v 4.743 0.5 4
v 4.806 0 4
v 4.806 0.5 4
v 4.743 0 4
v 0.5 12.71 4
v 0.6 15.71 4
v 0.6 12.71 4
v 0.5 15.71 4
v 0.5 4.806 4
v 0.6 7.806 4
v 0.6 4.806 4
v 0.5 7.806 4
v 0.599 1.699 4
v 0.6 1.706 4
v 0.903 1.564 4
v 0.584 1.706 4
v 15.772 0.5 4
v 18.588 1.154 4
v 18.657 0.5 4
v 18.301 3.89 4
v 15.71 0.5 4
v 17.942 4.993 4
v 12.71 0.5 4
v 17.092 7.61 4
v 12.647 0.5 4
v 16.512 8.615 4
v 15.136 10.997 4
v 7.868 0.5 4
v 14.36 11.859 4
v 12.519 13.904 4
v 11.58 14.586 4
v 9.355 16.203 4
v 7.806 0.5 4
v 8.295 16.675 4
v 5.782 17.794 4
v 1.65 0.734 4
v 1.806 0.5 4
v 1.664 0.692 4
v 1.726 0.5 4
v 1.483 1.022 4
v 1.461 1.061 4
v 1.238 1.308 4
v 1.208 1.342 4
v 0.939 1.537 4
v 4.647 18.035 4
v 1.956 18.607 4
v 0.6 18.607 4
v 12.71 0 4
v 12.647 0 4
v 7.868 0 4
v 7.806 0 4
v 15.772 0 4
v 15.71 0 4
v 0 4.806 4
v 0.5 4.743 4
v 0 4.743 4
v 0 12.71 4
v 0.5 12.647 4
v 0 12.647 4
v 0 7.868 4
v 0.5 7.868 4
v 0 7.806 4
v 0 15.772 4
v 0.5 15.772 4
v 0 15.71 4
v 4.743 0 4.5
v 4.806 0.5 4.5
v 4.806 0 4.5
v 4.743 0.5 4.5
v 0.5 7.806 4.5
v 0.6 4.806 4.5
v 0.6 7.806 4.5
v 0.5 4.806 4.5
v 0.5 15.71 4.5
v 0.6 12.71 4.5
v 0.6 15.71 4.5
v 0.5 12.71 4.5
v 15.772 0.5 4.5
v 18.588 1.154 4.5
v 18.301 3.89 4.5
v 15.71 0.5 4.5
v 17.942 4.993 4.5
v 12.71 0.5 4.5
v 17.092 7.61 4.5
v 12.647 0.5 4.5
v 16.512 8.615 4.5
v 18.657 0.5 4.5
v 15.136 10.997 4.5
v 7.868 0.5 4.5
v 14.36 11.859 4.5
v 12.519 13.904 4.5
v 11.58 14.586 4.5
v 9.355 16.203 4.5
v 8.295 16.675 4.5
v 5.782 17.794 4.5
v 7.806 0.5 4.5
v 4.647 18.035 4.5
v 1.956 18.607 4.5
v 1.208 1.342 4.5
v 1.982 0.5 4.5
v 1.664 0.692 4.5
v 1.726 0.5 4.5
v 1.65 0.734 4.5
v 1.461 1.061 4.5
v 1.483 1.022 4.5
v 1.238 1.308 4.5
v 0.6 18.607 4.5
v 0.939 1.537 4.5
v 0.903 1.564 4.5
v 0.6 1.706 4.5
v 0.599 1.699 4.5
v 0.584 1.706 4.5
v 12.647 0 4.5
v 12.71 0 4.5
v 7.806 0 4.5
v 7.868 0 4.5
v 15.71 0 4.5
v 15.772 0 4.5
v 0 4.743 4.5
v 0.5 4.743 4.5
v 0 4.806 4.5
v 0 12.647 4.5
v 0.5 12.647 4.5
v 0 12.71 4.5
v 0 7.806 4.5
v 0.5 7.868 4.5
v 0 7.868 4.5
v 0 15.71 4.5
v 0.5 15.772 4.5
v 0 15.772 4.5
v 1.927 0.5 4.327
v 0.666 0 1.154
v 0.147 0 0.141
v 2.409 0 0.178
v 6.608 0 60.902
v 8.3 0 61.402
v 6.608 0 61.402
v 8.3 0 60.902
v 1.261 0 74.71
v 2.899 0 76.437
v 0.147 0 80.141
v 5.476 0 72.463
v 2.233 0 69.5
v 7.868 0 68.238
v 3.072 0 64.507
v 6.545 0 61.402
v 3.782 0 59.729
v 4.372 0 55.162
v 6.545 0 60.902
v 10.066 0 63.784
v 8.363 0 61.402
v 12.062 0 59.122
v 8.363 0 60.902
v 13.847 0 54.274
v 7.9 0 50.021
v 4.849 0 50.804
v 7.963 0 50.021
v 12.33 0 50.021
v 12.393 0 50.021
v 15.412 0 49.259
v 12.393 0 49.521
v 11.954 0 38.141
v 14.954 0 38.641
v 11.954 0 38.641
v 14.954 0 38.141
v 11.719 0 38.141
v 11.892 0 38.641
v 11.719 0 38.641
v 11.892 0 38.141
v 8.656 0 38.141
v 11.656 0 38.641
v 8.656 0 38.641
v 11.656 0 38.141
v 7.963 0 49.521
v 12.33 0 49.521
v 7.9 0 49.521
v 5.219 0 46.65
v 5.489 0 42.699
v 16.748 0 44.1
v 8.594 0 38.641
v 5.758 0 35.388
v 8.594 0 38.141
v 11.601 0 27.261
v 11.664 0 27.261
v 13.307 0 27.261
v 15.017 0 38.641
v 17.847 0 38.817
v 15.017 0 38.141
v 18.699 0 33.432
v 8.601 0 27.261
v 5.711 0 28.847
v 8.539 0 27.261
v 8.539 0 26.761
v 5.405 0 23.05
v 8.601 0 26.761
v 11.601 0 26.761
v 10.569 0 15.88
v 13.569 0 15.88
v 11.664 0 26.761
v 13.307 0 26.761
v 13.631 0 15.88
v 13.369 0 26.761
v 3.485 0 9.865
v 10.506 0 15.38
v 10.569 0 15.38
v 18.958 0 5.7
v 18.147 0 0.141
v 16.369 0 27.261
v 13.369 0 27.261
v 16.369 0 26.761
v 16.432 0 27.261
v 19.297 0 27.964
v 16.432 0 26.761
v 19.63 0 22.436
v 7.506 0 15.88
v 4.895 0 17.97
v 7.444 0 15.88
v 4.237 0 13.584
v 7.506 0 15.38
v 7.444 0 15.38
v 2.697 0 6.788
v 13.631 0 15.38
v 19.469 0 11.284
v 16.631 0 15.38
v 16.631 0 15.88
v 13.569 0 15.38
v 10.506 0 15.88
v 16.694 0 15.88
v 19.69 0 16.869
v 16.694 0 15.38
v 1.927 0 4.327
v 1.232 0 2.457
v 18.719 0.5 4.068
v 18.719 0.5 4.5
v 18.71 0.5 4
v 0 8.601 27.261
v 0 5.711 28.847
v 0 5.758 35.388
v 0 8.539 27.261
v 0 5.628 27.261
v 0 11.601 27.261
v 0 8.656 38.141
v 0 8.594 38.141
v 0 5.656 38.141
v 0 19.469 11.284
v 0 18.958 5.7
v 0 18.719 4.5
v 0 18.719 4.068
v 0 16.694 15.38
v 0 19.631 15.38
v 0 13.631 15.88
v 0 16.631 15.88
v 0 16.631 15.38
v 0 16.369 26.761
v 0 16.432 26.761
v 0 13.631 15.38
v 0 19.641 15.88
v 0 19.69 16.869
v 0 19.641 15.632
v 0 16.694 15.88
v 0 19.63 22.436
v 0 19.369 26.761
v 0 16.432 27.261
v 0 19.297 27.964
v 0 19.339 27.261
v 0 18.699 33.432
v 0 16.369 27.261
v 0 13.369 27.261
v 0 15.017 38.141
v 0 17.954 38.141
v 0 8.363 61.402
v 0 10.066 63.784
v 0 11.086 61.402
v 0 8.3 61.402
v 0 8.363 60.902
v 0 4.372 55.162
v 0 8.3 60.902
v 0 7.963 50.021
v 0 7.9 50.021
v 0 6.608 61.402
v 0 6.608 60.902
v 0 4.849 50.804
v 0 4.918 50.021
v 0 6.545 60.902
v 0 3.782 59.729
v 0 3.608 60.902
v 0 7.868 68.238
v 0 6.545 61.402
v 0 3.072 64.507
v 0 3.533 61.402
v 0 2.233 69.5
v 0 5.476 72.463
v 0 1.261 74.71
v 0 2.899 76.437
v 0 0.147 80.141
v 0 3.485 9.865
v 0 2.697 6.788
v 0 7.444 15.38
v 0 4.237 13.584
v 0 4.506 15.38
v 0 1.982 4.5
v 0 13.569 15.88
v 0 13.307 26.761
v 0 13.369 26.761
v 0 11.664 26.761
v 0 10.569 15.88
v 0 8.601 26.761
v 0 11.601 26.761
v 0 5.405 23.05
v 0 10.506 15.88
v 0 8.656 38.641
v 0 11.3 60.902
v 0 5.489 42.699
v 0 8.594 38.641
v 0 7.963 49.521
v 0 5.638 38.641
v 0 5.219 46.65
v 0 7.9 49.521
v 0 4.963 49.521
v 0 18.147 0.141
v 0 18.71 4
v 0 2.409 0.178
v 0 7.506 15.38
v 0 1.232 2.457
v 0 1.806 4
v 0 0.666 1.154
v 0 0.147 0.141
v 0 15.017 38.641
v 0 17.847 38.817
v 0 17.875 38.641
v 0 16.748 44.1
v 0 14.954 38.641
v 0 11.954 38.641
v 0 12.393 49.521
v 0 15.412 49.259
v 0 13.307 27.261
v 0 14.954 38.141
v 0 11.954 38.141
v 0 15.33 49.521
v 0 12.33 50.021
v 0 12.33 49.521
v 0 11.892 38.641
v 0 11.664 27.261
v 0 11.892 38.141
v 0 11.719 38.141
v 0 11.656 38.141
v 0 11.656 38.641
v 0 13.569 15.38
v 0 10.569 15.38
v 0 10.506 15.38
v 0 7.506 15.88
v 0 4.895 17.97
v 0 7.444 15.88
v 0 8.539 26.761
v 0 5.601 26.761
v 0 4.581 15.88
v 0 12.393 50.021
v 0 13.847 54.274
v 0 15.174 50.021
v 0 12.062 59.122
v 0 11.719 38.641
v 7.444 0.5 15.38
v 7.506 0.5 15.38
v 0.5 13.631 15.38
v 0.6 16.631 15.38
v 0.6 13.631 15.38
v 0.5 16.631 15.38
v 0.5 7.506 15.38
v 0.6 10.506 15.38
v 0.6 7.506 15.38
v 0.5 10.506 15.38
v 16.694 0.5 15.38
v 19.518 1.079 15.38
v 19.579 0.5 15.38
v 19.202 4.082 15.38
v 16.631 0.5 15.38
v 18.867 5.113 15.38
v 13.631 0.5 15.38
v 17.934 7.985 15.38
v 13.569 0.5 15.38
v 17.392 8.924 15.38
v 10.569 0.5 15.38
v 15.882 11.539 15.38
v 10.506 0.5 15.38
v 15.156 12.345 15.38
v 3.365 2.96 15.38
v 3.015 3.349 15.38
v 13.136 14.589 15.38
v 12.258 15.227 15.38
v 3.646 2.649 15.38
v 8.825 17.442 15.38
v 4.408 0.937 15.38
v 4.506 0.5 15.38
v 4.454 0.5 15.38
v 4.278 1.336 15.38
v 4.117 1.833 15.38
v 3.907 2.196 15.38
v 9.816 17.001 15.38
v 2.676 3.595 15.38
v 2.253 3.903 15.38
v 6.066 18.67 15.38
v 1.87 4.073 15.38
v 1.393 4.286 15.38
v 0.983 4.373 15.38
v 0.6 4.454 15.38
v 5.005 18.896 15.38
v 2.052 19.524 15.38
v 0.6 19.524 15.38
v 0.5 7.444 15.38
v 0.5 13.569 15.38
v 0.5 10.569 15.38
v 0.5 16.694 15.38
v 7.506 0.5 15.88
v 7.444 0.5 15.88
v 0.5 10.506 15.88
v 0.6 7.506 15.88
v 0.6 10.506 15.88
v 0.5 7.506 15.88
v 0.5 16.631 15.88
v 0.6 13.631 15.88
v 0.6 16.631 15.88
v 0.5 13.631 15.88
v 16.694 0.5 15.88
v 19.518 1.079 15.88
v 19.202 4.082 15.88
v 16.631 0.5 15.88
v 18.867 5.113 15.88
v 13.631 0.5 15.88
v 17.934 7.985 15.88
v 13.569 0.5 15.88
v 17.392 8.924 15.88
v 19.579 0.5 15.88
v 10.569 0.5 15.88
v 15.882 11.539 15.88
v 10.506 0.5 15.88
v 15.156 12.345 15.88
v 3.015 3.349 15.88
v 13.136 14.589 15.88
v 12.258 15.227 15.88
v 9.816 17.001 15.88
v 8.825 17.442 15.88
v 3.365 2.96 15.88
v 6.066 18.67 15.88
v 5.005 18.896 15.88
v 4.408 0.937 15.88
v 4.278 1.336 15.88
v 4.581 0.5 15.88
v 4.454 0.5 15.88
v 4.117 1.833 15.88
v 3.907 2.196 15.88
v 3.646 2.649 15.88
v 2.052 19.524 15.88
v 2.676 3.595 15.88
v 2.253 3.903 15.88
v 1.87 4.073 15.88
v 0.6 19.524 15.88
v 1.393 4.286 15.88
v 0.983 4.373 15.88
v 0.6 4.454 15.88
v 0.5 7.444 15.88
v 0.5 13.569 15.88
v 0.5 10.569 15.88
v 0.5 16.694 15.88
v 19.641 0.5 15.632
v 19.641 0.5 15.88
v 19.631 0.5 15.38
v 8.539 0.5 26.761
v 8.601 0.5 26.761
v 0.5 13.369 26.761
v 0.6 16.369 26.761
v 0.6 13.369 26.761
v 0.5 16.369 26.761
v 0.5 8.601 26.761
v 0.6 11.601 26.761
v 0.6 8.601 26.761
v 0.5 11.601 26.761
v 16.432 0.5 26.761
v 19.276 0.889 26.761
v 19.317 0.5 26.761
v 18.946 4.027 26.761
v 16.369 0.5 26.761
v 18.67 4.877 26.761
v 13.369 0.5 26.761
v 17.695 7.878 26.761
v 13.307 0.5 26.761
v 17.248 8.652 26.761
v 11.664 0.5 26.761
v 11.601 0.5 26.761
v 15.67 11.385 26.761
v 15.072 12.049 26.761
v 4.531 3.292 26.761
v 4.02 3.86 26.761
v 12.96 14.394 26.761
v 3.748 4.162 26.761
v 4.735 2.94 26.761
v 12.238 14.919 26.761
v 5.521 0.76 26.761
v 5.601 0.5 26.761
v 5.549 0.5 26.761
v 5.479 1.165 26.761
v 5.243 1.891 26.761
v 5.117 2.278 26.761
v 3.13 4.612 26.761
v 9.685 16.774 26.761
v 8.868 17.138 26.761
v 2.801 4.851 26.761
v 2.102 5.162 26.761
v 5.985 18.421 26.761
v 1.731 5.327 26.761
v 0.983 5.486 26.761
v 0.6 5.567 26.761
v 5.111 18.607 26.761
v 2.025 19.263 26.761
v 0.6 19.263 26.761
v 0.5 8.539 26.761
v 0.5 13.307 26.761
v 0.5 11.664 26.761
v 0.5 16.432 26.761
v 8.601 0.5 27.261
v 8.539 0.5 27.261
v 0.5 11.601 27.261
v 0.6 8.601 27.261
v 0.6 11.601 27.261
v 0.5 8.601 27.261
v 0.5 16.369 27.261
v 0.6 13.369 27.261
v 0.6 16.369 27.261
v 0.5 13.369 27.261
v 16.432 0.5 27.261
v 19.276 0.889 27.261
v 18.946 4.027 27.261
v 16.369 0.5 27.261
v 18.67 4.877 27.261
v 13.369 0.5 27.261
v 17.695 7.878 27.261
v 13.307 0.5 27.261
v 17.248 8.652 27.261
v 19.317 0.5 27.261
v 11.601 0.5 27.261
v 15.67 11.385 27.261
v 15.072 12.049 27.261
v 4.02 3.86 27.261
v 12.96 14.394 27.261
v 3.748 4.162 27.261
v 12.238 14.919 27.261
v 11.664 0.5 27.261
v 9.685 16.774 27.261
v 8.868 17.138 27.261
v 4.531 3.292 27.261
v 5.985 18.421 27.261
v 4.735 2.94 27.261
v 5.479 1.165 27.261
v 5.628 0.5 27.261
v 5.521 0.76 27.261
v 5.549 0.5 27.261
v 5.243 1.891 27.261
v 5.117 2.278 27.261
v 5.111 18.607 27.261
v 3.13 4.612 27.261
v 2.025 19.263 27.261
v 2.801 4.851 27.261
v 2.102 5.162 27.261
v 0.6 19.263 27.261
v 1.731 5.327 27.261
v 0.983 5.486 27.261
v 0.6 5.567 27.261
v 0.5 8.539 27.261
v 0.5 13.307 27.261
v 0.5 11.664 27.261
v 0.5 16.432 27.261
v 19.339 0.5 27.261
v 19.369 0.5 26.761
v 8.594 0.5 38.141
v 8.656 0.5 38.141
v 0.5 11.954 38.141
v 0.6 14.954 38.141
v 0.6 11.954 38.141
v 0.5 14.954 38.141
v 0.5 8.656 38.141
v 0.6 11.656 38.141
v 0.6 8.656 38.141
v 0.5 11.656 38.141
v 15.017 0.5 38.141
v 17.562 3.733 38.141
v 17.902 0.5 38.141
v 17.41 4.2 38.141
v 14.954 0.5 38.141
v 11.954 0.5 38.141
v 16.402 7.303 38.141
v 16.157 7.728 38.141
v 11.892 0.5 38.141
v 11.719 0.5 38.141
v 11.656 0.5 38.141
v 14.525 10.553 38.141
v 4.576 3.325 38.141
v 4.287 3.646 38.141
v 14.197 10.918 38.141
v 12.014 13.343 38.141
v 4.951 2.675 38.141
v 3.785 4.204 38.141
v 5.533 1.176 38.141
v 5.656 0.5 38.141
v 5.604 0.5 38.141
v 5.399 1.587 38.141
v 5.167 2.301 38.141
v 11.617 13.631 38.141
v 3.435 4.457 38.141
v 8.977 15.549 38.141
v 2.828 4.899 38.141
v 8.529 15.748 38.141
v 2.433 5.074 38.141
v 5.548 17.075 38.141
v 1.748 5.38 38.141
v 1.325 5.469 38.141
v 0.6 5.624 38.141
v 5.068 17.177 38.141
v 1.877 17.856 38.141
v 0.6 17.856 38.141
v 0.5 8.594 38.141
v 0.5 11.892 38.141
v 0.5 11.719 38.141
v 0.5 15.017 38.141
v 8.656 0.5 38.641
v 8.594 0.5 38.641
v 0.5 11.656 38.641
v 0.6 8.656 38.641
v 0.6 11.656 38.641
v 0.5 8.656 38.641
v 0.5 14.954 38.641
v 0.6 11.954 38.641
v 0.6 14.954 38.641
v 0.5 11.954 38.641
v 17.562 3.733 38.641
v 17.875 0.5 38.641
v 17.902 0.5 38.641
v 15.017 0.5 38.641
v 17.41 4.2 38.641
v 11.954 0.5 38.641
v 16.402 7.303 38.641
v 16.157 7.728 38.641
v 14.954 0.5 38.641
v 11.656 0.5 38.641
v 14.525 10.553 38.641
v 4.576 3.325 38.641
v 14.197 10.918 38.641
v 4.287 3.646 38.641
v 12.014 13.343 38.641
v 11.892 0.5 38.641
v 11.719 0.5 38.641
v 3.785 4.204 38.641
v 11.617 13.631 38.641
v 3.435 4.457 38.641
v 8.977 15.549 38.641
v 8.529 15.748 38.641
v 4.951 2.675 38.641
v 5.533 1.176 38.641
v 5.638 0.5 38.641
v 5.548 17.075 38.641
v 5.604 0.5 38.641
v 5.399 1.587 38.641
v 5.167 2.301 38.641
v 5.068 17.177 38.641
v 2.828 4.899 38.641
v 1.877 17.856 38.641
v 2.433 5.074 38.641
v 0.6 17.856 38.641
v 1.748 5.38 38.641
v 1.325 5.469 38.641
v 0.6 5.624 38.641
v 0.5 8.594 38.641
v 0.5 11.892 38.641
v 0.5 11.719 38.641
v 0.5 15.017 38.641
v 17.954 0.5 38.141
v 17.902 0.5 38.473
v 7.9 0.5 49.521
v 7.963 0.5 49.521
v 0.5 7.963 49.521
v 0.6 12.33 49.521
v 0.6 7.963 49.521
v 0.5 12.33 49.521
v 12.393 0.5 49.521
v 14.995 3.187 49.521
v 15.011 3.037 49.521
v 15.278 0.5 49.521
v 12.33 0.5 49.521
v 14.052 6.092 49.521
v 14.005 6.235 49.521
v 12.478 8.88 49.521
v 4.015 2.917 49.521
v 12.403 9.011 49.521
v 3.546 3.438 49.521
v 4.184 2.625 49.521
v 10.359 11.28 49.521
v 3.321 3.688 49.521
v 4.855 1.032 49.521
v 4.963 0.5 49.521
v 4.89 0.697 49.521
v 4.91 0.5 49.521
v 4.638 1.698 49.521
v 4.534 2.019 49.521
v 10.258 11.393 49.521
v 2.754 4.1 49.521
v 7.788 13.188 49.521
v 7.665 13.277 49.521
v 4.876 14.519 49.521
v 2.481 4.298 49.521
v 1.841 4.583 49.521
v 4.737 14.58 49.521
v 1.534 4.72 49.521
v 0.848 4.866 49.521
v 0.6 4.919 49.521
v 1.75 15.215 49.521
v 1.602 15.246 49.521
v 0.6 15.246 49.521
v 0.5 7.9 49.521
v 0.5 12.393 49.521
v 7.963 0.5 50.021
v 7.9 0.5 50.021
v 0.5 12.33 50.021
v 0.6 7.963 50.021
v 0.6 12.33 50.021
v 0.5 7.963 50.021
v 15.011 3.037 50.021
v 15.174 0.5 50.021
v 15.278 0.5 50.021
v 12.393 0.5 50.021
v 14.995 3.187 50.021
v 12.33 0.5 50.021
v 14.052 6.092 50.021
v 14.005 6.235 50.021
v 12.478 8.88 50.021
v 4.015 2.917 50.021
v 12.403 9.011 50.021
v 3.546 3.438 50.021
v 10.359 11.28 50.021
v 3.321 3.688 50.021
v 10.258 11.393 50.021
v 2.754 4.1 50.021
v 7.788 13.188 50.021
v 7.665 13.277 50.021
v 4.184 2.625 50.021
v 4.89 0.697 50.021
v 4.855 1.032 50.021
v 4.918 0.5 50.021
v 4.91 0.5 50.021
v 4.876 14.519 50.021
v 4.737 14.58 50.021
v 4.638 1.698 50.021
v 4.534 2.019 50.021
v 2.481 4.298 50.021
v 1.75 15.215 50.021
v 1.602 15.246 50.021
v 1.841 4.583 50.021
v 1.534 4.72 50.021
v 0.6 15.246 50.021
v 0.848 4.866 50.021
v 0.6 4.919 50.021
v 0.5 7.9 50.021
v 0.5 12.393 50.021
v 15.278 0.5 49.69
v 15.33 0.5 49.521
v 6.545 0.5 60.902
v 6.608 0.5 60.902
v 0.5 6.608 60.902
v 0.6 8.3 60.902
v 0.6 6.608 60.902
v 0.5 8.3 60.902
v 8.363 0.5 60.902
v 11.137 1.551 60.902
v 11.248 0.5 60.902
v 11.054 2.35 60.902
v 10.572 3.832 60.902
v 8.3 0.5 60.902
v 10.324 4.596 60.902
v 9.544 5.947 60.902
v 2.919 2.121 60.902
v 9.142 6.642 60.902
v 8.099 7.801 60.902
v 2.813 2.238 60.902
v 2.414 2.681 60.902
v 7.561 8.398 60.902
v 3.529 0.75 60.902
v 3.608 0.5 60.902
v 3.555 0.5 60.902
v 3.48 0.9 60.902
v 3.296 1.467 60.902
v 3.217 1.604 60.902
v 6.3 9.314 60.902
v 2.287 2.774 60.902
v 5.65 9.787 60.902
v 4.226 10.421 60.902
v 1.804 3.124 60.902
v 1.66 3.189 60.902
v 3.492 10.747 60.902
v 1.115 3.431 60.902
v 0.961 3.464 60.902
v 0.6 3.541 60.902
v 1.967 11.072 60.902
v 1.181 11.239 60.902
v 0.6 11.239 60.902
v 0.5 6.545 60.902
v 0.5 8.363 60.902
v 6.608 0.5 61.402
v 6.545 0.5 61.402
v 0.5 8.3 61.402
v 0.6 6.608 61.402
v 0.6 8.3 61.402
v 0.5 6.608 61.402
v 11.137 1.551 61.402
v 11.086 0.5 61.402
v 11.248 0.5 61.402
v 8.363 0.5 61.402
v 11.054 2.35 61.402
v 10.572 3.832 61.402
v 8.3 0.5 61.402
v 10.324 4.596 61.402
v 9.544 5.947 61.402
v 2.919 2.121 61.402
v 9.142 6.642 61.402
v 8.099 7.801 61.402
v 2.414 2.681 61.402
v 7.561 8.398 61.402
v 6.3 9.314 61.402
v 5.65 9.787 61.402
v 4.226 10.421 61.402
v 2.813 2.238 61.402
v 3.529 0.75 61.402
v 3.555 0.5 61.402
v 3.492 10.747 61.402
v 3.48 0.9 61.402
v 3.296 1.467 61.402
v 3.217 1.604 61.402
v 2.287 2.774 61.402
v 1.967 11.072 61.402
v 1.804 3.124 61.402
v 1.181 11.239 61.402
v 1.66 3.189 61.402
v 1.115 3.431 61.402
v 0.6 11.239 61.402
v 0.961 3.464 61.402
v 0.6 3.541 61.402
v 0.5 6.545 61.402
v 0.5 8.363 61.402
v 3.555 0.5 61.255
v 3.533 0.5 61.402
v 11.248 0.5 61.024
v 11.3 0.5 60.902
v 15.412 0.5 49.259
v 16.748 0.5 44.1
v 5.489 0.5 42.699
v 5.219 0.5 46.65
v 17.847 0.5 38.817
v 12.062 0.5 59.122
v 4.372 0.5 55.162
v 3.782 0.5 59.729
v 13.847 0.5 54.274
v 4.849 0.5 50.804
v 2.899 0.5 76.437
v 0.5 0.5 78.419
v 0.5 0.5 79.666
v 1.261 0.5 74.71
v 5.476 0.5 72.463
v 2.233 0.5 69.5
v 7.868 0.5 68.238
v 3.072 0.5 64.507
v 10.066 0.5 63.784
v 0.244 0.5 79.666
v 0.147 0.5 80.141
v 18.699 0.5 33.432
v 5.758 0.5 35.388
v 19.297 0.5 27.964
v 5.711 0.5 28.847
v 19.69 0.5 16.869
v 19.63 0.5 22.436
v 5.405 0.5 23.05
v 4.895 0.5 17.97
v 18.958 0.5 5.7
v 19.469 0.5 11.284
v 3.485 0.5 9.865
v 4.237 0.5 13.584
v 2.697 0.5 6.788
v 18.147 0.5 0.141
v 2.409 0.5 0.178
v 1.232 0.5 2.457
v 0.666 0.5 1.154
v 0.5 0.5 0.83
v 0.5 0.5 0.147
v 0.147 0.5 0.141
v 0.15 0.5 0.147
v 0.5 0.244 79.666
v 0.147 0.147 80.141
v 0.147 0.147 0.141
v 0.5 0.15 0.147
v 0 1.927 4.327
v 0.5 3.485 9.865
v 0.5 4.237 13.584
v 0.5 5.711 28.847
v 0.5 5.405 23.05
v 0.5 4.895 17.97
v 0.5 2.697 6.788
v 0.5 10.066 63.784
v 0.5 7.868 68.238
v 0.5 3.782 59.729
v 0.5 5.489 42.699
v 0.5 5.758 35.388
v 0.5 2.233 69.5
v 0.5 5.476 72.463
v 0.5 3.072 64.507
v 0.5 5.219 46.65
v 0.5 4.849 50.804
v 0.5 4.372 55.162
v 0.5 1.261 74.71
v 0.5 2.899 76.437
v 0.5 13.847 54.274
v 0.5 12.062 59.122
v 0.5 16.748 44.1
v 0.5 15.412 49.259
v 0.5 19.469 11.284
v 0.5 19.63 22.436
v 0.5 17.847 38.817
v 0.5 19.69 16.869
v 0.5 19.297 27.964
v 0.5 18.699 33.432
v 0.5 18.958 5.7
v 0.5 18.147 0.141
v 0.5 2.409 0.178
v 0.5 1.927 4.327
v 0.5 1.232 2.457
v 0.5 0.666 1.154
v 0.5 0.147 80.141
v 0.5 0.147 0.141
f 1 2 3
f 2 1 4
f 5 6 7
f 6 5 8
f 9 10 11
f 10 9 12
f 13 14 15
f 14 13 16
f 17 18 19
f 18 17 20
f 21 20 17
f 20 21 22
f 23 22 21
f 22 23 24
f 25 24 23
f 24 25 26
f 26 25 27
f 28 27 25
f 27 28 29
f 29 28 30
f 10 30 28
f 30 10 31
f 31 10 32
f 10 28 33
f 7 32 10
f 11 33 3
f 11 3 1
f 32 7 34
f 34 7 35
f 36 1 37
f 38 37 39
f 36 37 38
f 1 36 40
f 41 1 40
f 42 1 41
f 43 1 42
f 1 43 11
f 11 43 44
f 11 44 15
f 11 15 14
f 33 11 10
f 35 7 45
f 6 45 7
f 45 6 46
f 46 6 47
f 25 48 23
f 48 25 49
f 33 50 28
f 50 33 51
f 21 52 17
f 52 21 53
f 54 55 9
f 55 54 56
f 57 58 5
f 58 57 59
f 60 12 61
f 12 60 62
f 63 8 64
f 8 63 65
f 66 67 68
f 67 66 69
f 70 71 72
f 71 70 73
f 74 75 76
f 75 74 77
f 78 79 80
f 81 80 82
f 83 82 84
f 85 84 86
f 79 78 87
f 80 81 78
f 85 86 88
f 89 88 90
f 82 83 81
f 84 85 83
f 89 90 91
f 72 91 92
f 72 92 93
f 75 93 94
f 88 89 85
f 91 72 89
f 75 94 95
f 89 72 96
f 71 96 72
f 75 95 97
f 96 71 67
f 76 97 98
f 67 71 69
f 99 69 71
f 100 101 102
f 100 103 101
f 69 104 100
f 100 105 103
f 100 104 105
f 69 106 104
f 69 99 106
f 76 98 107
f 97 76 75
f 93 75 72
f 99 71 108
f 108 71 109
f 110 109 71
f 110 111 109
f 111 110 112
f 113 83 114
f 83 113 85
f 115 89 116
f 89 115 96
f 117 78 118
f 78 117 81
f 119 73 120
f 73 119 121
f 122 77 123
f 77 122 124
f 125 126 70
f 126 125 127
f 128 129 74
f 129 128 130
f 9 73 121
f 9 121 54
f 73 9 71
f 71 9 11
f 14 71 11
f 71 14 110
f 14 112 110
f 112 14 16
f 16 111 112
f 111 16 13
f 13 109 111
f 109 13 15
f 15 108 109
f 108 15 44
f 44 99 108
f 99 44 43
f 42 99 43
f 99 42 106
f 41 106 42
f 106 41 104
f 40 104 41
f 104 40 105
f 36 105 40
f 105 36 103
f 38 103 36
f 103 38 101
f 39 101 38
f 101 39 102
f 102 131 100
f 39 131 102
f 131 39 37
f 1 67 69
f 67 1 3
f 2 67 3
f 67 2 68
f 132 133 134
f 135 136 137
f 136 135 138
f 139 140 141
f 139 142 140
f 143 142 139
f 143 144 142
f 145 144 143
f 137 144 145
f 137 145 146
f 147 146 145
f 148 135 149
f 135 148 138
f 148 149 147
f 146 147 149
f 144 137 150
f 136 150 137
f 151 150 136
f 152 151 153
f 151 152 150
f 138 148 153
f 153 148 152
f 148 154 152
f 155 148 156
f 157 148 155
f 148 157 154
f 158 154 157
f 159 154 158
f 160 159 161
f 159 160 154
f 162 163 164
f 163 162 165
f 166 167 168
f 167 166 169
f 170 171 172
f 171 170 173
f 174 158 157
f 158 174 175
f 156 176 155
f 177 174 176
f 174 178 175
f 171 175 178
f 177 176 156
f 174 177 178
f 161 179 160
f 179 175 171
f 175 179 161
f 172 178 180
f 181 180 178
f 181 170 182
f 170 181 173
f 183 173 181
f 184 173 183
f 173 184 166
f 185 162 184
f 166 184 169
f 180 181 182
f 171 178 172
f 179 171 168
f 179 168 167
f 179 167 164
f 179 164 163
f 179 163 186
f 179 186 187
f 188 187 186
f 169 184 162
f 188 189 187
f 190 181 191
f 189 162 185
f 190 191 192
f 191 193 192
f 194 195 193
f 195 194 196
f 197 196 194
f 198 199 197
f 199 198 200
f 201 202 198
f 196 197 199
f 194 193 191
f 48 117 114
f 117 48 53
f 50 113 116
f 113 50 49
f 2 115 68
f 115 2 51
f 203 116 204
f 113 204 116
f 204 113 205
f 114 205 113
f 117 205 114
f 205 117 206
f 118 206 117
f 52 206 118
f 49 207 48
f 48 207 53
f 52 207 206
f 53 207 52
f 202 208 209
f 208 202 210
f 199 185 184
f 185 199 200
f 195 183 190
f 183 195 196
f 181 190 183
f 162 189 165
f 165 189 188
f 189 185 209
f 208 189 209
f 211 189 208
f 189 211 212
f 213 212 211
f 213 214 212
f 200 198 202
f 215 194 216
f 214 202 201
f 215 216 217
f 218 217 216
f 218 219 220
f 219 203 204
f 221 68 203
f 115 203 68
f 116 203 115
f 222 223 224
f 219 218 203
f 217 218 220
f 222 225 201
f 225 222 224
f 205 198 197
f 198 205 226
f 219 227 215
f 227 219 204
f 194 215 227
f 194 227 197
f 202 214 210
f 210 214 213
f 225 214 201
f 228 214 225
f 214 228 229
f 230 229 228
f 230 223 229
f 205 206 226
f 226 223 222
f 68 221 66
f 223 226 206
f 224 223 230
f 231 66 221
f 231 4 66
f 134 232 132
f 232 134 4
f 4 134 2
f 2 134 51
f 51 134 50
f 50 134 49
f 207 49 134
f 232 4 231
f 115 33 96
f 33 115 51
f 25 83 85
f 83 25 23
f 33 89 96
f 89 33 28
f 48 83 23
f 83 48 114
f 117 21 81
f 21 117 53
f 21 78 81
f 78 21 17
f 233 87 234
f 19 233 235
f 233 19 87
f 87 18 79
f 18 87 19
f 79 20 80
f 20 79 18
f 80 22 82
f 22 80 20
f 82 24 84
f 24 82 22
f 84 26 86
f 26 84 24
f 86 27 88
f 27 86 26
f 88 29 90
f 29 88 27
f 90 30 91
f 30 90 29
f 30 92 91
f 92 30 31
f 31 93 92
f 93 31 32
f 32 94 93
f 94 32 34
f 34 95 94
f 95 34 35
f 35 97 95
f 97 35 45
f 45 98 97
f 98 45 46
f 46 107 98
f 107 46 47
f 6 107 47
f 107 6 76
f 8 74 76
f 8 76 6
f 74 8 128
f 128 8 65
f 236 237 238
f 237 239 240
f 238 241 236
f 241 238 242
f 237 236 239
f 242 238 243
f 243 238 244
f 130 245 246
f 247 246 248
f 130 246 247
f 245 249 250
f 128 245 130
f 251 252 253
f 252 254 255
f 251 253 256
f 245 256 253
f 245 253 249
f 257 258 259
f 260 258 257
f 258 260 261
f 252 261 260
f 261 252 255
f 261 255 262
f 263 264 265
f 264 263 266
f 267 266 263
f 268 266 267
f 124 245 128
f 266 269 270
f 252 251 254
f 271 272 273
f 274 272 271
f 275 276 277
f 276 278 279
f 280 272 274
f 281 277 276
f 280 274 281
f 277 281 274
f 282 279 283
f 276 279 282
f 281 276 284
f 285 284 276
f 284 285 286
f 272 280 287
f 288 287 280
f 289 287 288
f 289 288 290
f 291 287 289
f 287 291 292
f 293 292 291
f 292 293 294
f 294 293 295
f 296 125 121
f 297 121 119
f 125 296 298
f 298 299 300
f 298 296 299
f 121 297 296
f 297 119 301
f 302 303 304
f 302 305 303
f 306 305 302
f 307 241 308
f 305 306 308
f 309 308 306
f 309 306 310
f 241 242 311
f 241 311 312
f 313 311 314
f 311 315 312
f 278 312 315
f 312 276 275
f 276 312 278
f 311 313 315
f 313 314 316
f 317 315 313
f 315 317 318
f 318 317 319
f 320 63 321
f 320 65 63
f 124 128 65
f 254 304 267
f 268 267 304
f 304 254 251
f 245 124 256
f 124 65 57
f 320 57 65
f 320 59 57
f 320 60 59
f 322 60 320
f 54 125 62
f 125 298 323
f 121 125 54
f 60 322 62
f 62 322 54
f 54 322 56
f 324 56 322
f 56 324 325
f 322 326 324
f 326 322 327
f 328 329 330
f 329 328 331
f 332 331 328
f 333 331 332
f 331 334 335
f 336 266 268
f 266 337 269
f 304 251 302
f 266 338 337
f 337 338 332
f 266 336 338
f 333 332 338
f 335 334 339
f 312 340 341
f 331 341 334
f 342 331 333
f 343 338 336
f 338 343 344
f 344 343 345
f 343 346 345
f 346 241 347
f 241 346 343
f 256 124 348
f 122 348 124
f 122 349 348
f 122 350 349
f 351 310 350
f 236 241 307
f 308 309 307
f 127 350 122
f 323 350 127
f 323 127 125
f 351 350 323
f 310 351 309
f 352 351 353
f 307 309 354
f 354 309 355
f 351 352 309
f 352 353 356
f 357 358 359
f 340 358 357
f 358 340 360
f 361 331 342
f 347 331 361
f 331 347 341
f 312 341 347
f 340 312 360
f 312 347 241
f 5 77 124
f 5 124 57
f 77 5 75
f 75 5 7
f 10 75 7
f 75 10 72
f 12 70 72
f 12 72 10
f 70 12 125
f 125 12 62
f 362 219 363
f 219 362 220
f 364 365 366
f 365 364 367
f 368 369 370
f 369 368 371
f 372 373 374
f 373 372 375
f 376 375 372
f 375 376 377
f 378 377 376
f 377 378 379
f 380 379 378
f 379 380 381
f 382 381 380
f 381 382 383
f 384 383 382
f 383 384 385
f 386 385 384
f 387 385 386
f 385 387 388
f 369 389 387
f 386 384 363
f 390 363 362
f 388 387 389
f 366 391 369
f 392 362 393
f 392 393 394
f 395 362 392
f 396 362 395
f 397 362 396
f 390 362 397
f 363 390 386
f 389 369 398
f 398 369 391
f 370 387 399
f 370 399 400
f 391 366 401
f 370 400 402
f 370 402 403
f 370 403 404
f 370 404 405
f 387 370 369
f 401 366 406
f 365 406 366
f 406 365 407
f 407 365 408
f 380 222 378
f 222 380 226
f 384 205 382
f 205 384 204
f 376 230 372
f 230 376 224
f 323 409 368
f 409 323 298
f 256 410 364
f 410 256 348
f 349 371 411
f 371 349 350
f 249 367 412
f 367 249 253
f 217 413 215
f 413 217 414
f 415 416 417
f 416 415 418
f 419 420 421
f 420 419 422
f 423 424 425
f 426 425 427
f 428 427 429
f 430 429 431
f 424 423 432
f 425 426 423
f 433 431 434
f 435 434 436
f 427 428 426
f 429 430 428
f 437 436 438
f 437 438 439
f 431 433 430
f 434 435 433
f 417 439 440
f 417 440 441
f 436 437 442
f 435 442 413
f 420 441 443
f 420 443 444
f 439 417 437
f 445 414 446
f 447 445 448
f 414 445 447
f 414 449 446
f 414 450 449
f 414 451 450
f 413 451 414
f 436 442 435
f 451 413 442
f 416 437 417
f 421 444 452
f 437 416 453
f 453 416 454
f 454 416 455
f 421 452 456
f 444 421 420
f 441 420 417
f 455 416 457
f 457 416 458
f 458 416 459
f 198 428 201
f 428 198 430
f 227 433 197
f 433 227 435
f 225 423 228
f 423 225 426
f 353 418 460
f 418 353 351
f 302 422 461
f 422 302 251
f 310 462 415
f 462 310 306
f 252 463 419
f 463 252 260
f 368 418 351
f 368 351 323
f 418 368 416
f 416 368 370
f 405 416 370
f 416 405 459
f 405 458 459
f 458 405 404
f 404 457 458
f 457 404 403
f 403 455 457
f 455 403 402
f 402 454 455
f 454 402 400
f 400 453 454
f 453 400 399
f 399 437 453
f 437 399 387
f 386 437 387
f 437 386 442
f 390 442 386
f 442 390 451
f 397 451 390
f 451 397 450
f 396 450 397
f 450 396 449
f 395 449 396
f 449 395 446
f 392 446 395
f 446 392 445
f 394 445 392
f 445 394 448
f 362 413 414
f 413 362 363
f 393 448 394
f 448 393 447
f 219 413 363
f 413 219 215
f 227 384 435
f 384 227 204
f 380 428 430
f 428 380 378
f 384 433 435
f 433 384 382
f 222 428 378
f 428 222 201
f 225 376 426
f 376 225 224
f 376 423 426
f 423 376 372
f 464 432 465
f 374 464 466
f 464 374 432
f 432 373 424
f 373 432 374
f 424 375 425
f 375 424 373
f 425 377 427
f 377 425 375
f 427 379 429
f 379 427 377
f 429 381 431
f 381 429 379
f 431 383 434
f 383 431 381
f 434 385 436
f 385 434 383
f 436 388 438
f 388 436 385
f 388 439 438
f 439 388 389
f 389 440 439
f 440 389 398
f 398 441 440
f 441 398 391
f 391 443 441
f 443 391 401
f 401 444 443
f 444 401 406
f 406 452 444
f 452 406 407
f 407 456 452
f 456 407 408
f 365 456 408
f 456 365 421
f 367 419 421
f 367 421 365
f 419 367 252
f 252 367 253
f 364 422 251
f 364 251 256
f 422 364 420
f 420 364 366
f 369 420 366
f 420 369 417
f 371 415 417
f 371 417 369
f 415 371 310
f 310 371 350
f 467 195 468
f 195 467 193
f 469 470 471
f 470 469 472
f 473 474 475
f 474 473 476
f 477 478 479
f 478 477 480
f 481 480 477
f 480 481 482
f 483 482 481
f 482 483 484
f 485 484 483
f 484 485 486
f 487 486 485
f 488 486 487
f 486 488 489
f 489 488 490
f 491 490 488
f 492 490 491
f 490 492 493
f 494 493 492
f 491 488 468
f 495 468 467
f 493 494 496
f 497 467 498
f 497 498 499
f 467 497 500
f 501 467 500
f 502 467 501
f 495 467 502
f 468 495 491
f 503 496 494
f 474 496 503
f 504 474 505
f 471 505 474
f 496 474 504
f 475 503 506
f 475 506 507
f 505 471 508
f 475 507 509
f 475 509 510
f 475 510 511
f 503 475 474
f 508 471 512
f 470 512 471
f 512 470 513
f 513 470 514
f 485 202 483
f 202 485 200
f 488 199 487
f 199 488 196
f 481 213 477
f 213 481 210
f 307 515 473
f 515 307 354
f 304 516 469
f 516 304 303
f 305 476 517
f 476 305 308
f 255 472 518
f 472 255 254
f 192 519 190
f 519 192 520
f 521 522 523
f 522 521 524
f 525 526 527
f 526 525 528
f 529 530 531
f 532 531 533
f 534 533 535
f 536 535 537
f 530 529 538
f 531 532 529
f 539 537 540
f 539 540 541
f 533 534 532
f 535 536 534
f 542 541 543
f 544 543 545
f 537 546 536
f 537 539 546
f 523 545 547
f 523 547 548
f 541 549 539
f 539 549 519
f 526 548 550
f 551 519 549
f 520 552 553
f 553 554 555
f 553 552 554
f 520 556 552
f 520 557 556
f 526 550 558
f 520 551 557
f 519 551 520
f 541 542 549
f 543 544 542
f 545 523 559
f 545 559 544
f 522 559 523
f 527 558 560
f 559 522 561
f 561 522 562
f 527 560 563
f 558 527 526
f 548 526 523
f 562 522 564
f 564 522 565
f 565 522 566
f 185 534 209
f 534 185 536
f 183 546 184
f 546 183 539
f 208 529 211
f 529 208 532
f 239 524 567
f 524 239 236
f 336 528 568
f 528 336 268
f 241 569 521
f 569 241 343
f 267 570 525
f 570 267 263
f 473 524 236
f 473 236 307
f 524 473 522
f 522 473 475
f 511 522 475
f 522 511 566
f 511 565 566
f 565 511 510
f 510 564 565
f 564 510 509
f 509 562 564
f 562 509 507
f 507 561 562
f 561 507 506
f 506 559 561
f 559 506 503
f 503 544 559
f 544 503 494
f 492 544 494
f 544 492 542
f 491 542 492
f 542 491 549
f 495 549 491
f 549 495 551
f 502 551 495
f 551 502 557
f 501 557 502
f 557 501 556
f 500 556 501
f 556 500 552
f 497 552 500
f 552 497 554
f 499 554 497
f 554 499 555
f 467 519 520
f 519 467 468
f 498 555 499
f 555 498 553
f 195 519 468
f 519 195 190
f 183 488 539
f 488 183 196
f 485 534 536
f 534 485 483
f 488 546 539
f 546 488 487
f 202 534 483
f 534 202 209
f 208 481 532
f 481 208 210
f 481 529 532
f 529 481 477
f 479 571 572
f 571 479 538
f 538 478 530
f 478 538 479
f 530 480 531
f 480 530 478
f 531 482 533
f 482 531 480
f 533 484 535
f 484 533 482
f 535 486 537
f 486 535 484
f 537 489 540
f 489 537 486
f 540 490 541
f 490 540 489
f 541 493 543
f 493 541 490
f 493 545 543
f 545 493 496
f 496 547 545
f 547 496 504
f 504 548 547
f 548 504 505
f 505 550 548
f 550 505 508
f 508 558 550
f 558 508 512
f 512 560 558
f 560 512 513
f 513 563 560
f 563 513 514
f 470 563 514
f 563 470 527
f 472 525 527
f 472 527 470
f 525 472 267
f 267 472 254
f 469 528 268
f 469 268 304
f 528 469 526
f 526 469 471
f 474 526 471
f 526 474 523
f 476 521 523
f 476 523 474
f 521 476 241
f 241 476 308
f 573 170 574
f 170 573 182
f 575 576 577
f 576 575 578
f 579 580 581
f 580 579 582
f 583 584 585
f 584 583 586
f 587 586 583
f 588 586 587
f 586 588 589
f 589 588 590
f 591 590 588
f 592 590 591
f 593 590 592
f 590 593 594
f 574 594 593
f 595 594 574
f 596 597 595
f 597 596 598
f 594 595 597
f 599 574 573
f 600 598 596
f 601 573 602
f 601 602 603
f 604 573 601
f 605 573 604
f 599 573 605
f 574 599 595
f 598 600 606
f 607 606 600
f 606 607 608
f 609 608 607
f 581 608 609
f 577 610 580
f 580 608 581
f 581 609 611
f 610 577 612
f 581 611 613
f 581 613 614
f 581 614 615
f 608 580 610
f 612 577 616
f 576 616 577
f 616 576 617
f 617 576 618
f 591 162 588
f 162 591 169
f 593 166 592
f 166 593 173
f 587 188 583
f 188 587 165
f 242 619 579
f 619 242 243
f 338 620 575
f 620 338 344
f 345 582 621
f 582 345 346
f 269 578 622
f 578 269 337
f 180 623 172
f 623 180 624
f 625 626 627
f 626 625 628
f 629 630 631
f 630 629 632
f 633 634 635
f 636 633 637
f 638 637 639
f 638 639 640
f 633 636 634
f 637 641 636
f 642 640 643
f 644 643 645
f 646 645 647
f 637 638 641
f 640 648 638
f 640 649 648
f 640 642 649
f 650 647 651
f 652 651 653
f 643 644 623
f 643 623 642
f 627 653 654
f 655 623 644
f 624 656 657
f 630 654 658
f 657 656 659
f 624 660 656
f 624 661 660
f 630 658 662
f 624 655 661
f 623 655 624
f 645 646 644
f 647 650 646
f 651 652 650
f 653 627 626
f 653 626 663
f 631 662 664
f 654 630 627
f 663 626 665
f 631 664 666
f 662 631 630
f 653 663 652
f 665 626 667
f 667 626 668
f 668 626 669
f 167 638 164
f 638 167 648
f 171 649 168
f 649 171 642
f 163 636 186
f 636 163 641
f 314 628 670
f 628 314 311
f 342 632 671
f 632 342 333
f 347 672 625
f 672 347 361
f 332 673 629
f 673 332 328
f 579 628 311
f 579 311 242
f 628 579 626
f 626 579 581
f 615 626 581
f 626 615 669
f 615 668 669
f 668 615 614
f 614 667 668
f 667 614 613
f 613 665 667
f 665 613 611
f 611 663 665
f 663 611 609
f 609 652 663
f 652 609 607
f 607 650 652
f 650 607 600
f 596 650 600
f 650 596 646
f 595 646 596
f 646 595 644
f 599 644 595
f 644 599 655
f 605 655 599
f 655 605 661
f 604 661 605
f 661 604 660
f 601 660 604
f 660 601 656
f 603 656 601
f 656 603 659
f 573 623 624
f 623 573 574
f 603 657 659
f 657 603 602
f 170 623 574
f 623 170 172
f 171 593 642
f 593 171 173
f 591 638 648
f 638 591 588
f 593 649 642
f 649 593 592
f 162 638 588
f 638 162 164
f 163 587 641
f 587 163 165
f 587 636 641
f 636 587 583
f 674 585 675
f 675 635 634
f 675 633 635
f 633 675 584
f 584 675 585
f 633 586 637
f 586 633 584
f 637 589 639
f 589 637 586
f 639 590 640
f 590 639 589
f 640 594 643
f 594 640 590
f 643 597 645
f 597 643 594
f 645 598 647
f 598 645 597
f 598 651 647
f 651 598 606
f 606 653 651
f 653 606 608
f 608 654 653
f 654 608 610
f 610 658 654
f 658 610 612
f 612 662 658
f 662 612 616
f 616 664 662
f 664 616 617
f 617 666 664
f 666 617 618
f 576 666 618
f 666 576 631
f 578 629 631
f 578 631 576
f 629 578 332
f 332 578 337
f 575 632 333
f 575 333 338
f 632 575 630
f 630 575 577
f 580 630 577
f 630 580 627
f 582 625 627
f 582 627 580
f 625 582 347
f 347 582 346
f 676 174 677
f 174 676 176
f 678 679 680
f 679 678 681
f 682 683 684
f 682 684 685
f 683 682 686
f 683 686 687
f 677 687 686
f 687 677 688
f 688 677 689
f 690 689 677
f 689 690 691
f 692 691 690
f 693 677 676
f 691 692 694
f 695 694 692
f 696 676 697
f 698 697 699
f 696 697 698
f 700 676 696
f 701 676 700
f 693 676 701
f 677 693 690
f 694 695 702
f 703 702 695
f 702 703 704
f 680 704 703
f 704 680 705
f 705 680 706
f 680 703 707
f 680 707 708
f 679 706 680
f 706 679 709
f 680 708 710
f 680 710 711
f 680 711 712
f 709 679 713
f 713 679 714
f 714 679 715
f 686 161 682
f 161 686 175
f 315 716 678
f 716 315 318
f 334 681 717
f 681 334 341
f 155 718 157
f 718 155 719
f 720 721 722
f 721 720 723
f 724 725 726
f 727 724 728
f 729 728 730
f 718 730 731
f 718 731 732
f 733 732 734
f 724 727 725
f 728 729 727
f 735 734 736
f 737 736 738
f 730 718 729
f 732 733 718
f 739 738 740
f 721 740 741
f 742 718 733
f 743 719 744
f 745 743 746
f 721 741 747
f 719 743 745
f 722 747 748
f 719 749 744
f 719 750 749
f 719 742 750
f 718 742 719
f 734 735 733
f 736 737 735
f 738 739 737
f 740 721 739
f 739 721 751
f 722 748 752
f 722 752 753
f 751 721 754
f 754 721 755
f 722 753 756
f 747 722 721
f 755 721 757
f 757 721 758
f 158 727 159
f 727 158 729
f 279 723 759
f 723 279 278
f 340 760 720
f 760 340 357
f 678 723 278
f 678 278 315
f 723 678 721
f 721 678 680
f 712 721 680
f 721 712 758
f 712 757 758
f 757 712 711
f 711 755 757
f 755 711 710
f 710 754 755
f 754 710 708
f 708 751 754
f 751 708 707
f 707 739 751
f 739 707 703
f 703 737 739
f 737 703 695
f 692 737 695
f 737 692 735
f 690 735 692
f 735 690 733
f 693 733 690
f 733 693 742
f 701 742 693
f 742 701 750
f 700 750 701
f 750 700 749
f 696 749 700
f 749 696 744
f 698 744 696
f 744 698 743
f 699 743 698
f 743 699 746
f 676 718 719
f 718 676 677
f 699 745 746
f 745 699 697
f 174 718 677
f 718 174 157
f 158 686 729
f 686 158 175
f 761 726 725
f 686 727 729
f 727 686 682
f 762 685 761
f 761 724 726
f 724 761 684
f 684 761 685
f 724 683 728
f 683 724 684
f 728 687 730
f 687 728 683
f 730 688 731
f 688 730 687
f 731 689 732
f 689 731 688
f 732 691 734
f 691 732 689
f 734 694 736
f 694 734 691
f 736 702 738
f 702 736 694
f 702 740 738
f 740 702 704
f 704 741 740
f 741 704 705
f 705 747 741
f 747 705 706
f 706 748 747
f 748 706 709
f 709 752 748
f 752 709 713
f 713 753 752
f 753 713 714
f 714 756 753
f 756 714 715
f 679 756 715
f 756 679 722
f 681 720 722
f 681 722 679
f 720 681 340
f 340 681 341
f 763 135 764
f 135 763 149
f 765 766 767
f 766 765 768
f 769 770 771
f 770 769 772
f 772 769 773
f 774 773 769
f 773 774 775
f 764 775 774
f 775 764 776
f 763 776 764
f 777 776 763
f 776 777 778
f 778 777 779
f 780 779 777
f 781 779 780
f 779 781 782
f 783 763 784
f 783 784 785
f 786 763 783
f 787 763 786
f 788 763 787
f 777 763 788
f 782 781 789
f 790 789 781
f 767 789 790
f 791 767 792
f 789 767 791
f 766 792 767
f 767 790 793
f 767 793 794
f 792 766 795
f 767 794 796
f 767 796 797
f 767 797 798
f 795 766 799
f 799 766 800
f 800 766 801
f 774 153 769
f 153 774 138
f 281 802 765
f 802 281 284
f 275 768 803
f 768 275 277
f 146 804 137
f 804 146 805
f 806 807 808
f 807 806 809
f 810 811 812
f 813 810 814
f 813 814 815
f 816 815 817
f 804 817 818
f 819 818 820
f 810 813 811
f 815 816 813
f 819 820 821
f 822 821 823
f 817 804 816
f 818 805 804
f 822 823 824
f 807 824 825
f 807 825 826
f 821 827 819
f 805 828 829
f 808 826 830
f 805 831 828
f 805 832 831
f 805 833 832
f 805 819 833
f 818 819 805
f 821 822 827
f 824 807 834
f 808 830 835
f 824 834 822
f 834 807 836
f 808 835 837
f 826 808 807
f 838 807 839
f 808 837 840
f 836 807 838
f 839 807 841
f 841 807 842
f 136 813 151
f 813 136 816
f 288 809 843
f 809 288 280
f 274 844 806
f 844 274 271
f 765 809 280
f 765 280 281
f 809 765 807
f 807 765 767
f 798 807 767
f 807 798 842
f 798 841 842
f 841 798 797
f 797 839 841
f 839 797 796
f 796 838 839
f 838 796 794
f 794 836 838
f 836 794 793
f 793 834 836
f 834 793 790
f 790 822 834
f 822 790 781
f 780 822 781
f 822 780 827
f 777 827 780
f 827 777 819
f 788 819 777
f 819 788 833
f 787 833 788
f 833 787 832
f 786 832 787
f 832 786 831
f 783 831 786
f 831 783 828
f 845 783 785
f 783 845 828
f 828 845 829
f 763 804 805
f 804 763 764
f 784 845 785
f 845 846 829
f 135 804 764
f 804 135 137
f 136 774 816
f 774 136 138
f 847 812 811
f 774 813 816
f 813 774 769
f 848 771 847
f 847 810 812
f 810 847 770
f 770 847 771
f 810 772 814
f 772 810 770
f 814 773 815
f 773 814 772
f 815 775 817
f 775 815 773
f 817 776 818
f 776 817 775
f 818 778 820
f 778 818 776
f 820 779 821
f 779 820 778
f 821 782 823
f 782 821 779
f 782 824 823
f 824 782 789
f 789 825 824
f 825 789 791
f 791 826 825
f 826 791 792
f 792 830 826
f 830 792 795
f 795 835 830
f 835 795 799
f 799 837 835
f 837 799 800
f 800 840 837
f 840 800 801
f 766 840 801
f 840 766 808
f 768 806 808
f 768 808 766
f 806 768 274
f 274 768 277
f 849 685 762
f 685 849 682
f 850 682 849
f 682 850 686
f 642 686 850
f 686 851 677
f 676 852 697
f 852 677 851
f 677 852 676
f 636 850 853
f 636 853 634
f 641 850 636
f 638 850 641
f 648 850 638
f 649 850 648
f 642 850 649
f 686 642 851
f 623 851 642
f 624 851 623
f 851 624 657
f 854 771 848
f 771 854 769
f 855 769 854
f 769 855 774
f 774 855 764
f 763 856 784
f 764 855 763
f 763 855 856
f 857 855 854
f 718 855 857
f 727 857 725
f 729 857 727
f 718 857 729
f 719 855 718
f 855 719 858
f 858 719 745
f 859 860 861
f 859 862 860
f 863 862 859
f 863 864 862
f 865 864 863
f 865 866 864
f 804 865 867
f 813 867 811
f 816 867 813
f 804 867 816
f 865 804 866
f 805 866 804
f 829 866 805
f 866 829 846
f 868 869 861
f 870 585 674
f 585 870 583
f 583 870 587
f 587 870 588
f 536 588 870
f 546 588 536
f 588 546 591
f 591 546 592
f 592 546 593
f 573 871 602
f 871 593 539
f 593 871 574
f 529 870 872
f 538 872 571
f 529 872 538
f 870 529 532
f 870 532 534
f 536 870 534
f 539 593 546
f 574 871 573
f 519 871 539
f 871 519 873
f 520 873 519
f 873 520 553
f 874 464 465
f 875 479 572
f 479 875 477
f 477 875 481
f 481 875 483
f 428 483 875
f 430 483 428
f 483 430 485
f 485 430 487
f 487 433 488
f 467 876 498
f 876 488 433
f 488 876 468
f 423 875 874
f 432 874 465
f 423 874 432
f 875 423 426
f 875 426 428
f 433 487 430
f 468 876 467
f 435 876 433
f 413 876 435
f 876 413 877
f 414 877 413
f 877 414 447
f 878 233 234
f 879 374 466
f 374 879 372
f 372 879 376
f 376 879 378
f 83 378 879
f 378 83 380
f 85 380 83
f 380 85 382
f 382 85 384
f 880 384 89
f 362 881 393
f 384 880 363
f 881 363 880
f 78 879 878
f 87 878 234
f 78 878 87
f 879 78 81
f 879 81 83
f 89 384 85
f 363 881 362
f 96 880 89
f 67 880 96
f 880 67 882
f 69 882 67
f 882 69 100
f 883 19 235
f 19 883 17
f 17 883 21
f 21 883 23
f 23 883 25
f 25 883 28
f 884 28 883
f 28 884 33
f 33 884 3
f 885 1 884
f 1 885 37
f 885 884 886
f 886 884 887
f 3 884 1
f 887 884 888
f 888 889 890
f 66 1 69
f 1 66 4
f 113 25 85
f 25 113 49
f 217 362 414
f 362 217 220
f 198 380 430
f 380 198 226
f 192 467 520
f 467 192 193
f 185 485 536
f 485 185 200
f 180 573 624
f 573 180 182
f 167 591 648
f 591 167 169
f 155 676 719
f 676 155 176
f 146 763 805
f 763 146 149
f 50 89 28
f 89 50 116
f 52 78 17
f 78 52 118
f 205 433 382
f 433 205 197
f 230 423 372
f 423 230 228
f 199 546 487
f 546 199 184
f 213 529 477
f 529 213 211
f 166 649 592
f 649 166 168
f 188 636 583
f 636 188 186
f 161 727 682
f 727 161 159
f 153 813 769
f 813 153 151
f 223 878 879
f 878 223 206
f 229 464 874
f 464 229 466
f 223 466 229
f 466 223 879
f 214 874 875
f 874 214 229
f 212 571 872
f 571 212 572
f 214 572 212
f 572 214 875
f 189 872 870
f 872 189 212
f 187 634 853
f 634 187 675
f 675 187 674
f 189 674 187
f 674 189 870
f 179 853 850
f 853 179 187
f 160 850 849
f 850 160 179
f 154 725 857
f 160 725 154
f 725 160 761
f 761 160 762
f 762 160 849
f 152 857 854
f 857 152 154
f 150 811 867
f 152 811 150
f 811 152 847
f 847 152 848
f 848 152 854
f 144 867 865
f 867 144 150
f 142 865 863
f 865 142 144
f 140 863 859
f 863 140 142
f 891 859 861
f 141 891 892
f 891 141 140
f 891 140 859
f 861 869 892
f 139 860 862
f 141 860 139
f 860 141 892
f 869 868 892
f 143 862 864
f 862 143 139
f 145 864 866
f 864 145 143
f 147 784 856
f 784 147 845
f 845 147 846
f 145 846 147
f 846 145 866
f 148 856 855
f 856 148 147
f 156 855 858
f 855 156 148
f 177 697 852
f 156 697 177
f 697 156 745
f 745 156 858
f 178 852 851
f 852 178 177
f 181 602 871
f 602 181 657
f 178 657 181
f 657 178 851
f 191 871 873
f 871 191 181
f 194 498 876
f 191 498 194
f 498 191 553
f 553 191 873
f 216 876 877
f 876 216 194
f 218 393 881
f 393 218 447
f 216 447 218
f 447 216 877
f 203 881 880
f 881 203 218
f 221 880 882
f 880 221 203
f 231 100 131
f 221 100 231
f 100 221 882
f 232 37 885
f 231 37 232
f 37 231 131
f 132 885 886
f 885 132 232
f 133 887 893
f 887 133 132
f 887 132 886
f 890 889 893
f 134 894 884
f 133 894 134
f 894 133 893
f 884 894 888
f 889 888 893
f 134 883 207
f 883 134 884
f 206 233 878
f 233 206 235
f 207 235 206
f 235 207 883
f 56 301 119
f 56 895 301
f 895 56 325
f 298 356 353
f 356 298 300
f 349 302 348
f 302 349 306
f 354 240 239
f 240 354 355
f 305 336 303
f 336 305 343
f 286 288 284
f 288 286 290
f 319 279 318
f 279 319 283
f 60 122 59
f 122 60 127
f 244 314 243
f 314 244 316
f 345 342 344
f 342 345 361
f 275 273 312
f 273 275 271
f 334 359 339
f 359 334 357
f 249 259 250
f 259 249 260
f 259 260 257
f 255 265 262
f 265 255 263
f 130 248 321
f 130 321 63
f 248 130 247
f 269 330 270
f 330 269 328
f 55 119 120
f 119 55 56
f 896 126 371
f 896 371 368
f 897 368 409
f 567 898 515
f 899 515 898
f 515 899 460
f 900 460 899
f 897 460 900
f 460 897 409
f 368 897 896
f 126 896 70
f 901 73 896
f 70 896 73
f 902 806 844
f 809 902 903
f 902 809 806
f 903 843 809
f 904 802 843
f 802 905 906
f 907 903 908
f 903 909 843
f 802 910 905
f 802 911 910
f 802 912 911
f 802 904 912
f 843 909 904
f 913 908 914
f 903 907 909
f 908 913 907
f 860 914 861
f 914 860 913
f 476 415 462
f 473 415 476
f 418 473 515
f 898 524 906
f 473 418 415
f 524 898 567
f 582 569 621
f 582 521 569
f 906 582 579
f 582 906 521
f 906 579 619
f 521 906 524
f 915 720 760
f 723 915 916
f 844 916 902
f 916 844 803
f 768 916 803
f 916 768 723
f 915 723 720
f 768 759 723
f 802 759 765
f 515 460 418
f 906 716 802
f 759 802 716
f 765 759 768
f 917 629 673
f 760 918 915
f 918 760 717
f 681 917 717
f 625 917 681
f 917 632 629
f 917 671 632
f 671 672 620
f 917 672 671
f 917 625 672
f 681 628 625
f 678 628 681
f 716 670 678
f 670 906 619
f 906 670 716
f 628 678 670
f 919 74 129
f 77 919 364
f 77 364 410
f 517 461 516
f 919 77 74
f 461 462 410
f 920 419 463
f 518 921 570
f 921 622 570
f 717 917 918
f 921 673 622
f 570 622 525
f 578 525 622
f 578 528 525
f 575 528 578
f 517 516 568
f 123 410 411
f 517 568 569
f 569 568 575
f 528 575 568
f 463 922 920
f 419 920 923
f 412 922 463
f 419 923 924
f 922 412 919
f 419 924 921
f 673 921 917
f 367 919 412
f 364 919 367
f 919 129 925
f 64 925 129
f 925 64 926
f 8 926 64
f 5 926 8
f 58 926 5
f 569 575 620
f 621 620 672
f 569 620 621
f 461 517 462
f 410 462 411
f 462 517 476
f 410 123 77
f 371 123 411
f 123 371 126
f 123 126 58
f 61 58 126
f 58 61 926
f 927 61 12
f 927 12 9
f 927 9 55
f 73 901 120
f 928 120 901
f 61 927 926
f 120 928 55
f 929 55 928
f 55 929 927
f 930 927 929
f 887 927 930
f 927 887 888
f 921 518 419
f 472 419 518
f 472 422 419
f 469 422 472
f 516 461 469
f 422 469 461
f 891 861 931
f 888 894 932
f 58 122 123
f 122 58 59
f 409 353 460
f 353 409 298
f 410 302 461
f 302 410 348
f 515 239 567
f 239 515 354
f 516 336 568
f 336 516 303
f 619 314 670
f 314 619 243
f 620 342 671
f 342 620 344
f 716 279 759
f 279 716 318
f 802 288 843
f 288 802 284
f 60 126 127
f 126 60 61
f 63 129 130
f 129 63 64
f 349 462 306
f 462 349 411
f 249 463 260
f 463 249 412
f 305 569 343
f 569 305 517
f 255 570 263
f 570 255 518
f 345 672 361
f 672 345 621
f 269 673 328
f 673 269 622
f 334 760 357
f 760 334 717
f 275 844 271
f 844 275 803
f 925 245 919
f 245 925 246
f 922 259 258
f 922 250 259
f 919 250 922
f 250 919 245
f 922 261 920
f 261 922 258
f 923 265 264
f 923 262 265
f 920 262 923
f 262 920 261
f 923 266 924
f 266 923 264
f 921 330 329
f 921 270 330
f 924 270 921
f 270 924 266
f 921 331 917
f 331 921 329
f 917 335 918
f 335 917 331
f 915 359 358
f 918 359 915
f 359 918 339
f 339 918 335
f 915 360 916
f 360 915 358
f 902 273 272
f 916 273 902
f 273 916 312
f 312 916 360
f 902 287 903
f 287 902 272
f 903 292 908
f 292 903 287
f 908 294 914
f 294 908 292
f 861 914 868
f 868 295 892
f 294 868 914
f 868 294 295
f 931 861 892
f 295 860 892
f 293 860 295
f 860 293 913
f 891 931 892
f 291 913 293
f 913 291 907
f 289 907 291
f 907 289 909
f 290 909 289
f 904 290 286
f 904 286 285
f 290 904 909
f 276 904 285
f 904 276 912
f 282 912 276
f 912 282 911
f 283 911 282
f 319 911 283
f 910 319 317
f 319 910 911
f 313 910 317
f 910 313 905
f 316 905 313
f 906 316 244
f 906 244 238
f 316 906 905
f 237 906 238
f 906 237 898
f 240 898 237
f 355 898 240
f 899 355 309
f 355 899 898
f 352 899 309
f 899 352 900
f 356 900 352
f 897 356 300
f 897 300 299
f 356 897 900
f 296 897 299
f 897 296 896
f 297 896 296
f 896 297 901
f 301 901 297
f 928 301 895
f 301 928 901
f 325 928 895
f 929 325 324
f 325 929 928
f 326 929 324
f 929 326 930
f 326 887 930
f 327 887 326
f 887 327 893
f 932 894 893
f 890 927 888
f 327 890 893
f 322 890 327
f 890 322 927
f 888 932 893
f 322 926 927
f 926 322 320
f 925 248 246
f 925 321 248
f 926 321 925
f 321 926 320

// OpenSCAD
//find these values in inkscape
max_x = 19.837;
max_y = 80.282;

shelf_from_top = 8;
shelf_from_bottom = 4;

shelves = 6;
shelf_gap = (max_y-shelf_from_top-shelf_from_bottom)/shelves;

plywood = 0.5;

gap = 1/16;
gapp = gap*2;

pad = 0.1;
padd = pad*2;

wall=3;
tab=3;

module inkscape() {
    translate([max_x/2,max_y/2])
    scale([25.4/90, -25.4/90, 1]) union() {
        polygon([[-34.624245,-141.732290],[-24.871105,-128.609398],[-15.741286,-114.525819],[-7.265988,-99.556167],[0.523588,-83.775058],[7.596243,-67.257106],[13.920775,-50.076925],[19.465985,-32.309129],[24.200672,-14.028334],[28.093635,4.690847],[31.113675,23.773799],[33.229590,43.145907],[34.410180,62.732558],[34.624245,82.459136],[33.840584,102.251027],[32.027997,122.033616],[29.155283,141.732290],[-26.607159,141.600028],[-34.624245,141.732290],[-32.784021,138.144433],[-30.779491,133.524406],[-28.314906,126.900132],[-25.587431,118.181473],[-22.794234,107.278292],[-20.132482,94.100454],[-17.799341,78.557820],[-15.991979,60.560254],[-14.907561,40.017620],[-14.743255,16.839780],[-15.696228,-9.063402],[-16.653309,-23.065164],[-17.963647,-37.782063],[-19.651888,-53.225366],[-21.742678,-69.406340],[-24.260663,-86.336253],[-27.230488,-104.026370],[-30.676800,-122.487960],[-34.624245,-141.732290]]);
    }
}

module solid() {
    difference() {
        intersection() {
            rotate_extrude()
            inkscape();
            cube([max_x,max_x,max_y]);
        }
        translate([0,plywood,0])
        shelf_tab_cuts();
        rotate([0,0,90])
        shelf_tab_cuts();
   }
}

module shelf_tab_cuts() {
    rotate([90,0,0])
    linear_extrude(height=plywood+pad)
    difference() {
        union() {
            translate([pad,0])
            inkscape();
            translate([-pad,0])
            inkscape();
        }
        difference() {
            intersection() {
                translate([-wall,0])
                inkscape();
                translate([wall,0])
                inkscape();
            }
            intersection() {
                translate([-wall-tab,0])
                inkscape();
                translate([wall+tab,0])
                inkscape();
            }
        }
    }
}

module shelf(i) {
    projection(cut=true)
    translate([0,0,-i*shelf_gap-shelf_from_bottom])
    solid();
}

module assemble_shelves() {
    for(i=[0:shelves-1]) {
        translate([0,0,i*shelf_gap+shelf_from_bottom])
        linear_extrude(height=plywood)
        shelf(i);
    }
}

module side3d() {
    difference() {
        translate([0,0,-plywood])
        linear_extrude(height=plywood)
        inkscape();
        translate([-gap,0,0])
        rotate([-90,0,0])
        assemble_shelves();
        translate([gap,0,0])
        rotate([-90,0,0])
        assemble_shelves();
    }
}

module side2d() {
    projection()
    side3d();
}

module assemble() {
    color("magenta")
    assemble_shelves();
    rotate([90,0,0])
    side3d();
    translate([plywood,0,0])
    rotate([90,0,90])
    side3d();
}

tree = 3;

module plate() {
    for(i=[0:shelves-1]) {
        translate([0,i*(max_x+tree)])
        shelf(i);
    }
    translate([max_x+tree,0])
    side2d();
    translate([(max_x+tree)*2,0])
    side2d();
}
//plate();
assemble();
